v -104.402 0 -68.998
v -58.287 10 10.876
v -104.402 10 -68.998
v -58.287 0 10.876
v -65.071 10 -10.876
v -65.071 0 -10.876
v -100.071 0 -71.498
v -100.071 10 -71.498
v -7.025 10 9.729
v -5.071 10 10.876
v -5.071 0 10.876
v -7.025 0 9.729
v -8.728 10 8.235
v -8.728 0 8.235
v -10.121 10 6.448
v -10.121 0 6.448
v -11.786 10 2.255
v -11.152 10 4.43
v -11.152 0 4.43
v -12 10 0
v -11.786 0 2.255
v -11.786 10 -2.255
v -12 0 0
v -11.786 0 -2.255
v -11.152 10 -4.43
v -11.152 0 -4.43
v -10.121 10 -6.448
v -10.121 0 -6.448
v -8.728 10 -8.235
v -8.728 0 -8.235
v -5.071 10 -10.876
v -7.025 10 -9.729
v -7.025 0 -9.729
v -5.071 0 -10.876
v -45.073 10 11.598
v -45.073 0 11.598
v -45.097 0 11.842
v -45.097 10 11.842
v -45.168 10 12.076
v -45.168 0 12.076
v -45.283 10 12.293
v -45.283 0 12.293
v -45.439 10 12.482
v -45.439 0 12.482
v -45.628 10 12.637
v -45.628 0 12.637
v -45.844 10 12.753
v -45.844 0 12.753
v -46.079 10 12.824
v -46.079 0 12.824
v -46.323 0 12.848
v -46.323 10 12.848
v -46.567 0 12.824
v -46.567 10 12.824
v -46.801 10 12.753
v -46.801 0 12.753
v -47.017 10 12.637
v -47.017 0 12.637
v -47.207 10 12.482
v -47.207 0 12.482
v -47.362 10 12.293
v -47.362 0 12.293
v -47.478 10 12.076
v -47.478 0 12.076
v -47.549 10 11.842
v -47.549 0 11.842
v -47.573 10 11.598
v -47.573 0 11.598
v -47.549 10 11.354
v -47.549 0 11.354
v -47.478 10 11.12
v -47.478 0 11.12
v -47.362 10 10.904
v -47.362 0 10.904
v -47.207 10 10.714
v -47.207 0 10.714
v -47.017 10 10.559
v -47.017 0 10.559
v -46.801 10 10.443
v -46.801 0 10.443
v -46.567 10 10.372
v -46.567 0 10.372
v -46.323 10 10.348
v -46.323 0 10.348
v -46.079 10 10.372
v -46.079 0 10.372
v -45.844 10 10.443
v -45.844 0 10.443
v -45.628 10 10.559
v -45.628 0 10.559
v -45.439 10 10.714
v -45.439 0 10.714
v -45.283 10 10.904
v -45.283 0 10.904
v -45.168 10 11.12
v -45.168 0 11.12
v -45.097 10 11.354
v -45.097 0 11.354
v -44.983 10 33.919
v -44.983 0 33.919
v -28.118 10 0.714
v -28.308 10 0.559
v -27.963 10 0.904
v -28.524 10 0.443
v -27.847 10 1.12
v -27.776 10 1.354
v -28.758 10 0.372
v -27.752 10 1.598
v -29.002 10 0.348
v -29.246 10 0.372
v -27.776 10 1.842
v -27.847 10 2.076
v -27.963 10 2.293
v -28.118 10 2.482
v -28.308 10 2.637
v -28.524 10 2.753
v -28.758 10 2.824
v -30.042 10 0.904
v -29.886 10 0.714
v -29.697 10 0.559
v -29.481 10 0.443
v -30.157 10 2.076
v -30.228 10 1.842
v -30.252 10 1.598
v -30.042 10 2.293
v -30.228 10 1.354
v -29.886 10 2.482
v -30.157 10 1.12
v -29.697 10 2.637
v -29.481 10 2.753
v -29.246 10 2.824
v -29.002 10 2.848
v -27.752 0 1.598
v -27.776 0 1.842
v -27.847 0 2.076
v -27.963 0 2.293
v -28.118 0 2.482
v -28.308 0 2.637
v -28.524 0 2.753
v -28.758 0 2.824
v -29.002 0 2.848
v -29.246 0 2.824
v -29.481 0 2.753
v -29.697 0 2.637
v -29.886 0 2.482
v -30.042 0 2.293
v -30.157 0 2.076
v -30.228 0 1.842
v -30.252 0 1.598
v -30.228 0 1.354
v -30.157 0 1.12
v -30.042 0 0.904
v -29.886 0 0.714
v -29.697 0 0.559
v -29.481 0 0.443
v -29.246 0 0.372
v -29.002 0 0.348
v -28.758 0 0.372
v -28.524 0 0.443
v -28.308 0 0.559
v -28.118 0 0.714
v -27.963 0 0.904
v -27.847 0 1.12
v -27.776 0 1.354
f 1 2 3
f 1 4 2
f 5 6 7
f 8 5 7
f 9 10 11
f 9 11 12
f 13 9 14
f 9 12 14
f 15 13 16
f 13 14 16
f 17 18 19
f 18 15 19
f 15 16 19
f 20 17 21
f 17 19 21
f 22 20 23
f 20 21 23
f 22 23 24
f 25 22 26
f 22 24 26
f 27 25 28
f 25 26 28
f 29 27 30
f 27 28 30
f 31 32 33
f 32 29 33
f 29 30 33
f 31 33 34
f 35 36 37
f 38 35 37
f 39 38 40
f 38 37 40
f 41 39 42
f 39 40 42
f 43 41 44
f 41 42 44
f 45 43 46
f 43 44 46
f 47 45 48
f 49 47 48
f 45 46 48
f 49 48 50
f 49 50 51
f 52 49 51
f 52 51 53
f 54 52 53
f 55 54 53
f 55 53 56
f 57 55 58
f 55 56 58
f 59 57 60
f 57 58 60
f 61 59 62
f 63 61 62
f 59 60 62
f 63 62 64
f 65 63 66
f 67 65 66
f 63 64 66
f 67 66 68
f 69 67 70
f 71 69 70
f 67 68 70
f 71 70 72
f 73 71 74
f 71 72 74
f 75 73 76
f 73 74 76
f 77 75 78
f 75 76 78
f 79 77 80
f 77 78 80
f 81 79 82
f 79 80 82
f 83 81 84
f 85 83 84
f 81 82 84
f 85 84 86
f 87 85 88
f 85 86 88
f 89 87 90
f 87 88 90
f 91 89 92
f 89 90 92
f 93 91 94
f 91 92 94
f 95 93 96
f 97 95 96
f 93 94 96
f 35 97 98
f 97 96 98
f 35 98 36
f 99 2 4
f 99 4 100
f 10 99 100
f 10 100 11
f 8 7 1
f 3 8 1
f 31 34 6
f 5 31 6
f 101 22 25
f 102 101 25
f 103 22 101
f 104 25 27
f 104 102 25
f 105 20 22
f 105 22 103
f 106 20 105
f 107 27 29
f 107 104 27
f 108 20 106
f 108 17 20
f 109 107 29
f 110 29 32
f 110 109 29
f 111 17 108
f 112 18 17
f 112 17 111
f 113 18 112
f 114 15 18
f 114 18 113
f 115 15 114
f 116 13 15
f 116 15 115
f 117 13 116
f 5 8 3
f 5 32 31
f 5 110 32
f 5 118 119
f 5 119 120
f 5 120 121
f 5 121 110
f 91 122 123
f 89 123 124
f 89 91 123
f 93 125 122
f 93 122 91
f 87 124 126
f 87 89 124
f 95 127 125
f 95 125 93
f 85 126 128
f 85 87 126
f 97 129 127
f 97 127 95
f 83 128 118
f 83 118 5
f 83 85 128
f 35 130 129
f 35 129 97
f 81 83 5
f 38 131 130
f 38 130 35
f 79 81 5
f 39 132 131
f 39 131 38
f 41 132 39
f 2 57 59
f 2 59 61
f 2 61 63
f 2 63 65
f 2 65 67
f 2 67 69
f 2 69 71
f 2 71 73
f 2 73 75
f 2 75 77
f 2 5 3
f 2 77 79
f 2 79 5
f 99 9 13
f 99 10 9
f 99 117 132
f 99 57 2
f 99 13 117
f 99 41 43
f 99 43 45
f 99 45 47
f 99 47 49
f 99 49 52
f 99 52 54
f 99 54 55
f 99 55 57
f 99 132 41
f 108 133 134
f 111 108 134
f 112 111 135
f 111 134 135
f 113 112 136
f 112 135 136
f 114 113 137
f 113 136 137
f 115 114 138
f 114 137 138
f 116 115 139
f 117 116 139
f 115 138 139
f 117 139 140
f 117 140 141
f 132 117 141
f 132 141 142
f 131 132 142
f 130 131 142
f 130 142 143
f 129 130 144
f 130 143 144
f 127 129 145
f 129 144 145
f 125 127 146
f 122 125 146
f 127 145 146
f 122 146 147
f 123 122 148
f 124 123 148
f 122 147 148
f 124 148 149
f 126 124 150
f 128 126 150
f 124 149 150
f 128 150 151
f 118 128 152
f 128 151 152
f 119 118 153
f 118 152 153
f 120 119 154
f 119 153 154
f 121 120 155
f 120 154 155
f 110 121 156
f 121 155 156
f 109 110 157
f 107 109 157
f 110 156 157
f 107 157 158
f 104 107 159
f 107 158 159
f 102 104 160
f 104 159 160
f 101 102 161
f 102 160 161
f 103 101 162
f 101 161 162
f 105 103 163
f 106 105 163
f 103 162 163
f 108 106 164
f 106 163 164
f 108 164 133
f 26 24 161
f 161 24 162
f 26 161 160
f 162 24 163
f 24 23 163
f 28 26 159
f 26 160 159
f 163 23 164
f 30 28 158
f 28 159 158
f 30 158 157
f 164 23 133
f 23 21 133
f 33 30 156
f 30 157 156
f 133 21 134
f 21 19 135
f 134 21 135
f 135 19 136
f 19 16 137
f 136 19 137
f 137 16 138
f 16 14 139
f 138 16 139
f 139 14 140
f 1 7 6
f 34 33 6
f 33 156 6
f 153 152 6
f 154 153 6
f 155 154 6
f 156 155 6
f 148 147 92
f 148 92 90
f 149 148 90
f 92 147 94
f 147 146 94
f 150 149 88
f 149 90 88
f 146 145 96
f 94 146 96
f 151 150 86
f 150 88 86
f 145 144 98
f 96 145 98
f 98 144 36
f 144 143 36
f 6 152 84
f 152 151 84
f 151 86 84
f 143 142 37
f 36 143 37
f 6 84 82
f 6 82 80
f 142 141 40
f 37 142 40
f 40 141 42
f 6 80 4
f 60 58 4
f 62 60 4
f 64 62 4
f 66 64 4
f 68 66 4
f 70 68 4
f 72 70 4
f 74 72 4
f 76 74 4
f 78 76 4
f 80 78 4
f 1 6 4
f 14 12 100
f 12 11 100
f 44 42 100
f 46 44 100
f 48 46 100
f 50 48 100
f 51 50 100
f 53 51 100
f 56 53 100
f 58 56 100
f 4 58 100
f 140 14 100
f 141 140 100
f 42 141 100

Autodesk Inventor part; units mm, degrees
ref_plane "YZ Plane" through (0, 0, 0) normal (1, 0, 0) x (0, 1, 0)
ref_plane "XZ Plane" through (0, 0, 0) normal (0, 1, 0) x (-1, 0, 0)
ref_plane "XY Plane" through (0, 0, 0) normal (0, 0, 1) x (1, 0, 0)
sketch "Sketch1" plane through (0, 0, 0) normal (0, 1, 0) x (-1, 0, 0)
  point P0 (0, 0)
sketch "Sketch2" plane through (0, 0, 0) normal (0, 1, 0) x (-1, 0, 0)
  circle A0 centre (0, 0) radius 10 construction
  arc A1 (5.0714, -10.8757) -> (5.0714, 10.8757) centre (0, 0) ccw
  line L0 (5.0714, 10.8757) -> (5.0714, -10.8757) construction
  line L1 (5.0714, 10.8757) -> (26.8228, 10.8757) construction
  line L2 (5.0714, -10.8757) -> (65.0714, -10.8757)
  line L3 (5.0714, -10.8757) -> (65.0714, -10.8757) construction
  line L4 (65.0714, -10.8757) -> (100.0714, -71.4975)
  line L5 (100.0714, -71.4975) -> (104.4015, -68.9975)
  line L6 (5.0714, 10.8757) -> (58.2868, 10.8757)
  line L7 (58.2868, 10.8757) -> (104.4015, -68.9975)
  dimension "d0" = 20
  dimension "d1" = 90
  dimension "d2" = 2
  dimension "d3" = 130
  dimension "d4" = 60
  dimension "d5" = 0
  dimension "d6" = 70
  dimension "d7" = 120
  dimension "d8" = 5
extrude "Extrusion1" add sketch "Sketch2" along normal blind 10
sketch "Sketch3" plane through (0, 10, 0) normal (0, 1, 0) x (1, 0, 0)
  line L0 (-58.2868, -10.8757) -> (-104.4015, 68.9975) projected
  line L1 (-58.2868, -10.8757) -> (-44.9829, -33.9186)
  arc A0 (-5.0714, 10.8757) -> (-5.0714, -10.8757) centre (0, 0) ccw projected
  line L2 (-44.9829, -33.9186) -> (-5.0714, -10.8757)
  line L3 (-58.2868, -10.8757) -> (-5.0714, -10.8757) projected
  line L4 (-58.2868, -10.8757) -> (-5.0714, -10.8757)
extrude "Extrusion2" add sketch "Sketch3" against normal blind 10
sketch "Sketch4" plane through (0, 0, 0) normal (0, -1, 0) x (1, 0, 0)
  circle A0 centre (-46.3227, 11.5981) radius 1.25
  circle A1 centre (-29.0022, 1.5981) radius 1.25
  line L0 (-29.0022, 1.5981) -> (-46.3227, 11.5981) construction
  line L1 (-44.9829, 33.9186) -> (-104.4015, -68.9975) construction
  line L2 (-5.0714, 10.8757) -> (-44.9829, 33.9186) construction
  point P0 (0, 0)
  dimension "d13" = 2.5
  dimension "d14" = 2.5
  dimension "d15" = 20
  dimension "d16" = 10
  dimension "d17" = 20
extrude "Extrusion3" cut sketch "Sketch4" along normal through all both and the other way through all
properties part number "flipper-hug-left"
